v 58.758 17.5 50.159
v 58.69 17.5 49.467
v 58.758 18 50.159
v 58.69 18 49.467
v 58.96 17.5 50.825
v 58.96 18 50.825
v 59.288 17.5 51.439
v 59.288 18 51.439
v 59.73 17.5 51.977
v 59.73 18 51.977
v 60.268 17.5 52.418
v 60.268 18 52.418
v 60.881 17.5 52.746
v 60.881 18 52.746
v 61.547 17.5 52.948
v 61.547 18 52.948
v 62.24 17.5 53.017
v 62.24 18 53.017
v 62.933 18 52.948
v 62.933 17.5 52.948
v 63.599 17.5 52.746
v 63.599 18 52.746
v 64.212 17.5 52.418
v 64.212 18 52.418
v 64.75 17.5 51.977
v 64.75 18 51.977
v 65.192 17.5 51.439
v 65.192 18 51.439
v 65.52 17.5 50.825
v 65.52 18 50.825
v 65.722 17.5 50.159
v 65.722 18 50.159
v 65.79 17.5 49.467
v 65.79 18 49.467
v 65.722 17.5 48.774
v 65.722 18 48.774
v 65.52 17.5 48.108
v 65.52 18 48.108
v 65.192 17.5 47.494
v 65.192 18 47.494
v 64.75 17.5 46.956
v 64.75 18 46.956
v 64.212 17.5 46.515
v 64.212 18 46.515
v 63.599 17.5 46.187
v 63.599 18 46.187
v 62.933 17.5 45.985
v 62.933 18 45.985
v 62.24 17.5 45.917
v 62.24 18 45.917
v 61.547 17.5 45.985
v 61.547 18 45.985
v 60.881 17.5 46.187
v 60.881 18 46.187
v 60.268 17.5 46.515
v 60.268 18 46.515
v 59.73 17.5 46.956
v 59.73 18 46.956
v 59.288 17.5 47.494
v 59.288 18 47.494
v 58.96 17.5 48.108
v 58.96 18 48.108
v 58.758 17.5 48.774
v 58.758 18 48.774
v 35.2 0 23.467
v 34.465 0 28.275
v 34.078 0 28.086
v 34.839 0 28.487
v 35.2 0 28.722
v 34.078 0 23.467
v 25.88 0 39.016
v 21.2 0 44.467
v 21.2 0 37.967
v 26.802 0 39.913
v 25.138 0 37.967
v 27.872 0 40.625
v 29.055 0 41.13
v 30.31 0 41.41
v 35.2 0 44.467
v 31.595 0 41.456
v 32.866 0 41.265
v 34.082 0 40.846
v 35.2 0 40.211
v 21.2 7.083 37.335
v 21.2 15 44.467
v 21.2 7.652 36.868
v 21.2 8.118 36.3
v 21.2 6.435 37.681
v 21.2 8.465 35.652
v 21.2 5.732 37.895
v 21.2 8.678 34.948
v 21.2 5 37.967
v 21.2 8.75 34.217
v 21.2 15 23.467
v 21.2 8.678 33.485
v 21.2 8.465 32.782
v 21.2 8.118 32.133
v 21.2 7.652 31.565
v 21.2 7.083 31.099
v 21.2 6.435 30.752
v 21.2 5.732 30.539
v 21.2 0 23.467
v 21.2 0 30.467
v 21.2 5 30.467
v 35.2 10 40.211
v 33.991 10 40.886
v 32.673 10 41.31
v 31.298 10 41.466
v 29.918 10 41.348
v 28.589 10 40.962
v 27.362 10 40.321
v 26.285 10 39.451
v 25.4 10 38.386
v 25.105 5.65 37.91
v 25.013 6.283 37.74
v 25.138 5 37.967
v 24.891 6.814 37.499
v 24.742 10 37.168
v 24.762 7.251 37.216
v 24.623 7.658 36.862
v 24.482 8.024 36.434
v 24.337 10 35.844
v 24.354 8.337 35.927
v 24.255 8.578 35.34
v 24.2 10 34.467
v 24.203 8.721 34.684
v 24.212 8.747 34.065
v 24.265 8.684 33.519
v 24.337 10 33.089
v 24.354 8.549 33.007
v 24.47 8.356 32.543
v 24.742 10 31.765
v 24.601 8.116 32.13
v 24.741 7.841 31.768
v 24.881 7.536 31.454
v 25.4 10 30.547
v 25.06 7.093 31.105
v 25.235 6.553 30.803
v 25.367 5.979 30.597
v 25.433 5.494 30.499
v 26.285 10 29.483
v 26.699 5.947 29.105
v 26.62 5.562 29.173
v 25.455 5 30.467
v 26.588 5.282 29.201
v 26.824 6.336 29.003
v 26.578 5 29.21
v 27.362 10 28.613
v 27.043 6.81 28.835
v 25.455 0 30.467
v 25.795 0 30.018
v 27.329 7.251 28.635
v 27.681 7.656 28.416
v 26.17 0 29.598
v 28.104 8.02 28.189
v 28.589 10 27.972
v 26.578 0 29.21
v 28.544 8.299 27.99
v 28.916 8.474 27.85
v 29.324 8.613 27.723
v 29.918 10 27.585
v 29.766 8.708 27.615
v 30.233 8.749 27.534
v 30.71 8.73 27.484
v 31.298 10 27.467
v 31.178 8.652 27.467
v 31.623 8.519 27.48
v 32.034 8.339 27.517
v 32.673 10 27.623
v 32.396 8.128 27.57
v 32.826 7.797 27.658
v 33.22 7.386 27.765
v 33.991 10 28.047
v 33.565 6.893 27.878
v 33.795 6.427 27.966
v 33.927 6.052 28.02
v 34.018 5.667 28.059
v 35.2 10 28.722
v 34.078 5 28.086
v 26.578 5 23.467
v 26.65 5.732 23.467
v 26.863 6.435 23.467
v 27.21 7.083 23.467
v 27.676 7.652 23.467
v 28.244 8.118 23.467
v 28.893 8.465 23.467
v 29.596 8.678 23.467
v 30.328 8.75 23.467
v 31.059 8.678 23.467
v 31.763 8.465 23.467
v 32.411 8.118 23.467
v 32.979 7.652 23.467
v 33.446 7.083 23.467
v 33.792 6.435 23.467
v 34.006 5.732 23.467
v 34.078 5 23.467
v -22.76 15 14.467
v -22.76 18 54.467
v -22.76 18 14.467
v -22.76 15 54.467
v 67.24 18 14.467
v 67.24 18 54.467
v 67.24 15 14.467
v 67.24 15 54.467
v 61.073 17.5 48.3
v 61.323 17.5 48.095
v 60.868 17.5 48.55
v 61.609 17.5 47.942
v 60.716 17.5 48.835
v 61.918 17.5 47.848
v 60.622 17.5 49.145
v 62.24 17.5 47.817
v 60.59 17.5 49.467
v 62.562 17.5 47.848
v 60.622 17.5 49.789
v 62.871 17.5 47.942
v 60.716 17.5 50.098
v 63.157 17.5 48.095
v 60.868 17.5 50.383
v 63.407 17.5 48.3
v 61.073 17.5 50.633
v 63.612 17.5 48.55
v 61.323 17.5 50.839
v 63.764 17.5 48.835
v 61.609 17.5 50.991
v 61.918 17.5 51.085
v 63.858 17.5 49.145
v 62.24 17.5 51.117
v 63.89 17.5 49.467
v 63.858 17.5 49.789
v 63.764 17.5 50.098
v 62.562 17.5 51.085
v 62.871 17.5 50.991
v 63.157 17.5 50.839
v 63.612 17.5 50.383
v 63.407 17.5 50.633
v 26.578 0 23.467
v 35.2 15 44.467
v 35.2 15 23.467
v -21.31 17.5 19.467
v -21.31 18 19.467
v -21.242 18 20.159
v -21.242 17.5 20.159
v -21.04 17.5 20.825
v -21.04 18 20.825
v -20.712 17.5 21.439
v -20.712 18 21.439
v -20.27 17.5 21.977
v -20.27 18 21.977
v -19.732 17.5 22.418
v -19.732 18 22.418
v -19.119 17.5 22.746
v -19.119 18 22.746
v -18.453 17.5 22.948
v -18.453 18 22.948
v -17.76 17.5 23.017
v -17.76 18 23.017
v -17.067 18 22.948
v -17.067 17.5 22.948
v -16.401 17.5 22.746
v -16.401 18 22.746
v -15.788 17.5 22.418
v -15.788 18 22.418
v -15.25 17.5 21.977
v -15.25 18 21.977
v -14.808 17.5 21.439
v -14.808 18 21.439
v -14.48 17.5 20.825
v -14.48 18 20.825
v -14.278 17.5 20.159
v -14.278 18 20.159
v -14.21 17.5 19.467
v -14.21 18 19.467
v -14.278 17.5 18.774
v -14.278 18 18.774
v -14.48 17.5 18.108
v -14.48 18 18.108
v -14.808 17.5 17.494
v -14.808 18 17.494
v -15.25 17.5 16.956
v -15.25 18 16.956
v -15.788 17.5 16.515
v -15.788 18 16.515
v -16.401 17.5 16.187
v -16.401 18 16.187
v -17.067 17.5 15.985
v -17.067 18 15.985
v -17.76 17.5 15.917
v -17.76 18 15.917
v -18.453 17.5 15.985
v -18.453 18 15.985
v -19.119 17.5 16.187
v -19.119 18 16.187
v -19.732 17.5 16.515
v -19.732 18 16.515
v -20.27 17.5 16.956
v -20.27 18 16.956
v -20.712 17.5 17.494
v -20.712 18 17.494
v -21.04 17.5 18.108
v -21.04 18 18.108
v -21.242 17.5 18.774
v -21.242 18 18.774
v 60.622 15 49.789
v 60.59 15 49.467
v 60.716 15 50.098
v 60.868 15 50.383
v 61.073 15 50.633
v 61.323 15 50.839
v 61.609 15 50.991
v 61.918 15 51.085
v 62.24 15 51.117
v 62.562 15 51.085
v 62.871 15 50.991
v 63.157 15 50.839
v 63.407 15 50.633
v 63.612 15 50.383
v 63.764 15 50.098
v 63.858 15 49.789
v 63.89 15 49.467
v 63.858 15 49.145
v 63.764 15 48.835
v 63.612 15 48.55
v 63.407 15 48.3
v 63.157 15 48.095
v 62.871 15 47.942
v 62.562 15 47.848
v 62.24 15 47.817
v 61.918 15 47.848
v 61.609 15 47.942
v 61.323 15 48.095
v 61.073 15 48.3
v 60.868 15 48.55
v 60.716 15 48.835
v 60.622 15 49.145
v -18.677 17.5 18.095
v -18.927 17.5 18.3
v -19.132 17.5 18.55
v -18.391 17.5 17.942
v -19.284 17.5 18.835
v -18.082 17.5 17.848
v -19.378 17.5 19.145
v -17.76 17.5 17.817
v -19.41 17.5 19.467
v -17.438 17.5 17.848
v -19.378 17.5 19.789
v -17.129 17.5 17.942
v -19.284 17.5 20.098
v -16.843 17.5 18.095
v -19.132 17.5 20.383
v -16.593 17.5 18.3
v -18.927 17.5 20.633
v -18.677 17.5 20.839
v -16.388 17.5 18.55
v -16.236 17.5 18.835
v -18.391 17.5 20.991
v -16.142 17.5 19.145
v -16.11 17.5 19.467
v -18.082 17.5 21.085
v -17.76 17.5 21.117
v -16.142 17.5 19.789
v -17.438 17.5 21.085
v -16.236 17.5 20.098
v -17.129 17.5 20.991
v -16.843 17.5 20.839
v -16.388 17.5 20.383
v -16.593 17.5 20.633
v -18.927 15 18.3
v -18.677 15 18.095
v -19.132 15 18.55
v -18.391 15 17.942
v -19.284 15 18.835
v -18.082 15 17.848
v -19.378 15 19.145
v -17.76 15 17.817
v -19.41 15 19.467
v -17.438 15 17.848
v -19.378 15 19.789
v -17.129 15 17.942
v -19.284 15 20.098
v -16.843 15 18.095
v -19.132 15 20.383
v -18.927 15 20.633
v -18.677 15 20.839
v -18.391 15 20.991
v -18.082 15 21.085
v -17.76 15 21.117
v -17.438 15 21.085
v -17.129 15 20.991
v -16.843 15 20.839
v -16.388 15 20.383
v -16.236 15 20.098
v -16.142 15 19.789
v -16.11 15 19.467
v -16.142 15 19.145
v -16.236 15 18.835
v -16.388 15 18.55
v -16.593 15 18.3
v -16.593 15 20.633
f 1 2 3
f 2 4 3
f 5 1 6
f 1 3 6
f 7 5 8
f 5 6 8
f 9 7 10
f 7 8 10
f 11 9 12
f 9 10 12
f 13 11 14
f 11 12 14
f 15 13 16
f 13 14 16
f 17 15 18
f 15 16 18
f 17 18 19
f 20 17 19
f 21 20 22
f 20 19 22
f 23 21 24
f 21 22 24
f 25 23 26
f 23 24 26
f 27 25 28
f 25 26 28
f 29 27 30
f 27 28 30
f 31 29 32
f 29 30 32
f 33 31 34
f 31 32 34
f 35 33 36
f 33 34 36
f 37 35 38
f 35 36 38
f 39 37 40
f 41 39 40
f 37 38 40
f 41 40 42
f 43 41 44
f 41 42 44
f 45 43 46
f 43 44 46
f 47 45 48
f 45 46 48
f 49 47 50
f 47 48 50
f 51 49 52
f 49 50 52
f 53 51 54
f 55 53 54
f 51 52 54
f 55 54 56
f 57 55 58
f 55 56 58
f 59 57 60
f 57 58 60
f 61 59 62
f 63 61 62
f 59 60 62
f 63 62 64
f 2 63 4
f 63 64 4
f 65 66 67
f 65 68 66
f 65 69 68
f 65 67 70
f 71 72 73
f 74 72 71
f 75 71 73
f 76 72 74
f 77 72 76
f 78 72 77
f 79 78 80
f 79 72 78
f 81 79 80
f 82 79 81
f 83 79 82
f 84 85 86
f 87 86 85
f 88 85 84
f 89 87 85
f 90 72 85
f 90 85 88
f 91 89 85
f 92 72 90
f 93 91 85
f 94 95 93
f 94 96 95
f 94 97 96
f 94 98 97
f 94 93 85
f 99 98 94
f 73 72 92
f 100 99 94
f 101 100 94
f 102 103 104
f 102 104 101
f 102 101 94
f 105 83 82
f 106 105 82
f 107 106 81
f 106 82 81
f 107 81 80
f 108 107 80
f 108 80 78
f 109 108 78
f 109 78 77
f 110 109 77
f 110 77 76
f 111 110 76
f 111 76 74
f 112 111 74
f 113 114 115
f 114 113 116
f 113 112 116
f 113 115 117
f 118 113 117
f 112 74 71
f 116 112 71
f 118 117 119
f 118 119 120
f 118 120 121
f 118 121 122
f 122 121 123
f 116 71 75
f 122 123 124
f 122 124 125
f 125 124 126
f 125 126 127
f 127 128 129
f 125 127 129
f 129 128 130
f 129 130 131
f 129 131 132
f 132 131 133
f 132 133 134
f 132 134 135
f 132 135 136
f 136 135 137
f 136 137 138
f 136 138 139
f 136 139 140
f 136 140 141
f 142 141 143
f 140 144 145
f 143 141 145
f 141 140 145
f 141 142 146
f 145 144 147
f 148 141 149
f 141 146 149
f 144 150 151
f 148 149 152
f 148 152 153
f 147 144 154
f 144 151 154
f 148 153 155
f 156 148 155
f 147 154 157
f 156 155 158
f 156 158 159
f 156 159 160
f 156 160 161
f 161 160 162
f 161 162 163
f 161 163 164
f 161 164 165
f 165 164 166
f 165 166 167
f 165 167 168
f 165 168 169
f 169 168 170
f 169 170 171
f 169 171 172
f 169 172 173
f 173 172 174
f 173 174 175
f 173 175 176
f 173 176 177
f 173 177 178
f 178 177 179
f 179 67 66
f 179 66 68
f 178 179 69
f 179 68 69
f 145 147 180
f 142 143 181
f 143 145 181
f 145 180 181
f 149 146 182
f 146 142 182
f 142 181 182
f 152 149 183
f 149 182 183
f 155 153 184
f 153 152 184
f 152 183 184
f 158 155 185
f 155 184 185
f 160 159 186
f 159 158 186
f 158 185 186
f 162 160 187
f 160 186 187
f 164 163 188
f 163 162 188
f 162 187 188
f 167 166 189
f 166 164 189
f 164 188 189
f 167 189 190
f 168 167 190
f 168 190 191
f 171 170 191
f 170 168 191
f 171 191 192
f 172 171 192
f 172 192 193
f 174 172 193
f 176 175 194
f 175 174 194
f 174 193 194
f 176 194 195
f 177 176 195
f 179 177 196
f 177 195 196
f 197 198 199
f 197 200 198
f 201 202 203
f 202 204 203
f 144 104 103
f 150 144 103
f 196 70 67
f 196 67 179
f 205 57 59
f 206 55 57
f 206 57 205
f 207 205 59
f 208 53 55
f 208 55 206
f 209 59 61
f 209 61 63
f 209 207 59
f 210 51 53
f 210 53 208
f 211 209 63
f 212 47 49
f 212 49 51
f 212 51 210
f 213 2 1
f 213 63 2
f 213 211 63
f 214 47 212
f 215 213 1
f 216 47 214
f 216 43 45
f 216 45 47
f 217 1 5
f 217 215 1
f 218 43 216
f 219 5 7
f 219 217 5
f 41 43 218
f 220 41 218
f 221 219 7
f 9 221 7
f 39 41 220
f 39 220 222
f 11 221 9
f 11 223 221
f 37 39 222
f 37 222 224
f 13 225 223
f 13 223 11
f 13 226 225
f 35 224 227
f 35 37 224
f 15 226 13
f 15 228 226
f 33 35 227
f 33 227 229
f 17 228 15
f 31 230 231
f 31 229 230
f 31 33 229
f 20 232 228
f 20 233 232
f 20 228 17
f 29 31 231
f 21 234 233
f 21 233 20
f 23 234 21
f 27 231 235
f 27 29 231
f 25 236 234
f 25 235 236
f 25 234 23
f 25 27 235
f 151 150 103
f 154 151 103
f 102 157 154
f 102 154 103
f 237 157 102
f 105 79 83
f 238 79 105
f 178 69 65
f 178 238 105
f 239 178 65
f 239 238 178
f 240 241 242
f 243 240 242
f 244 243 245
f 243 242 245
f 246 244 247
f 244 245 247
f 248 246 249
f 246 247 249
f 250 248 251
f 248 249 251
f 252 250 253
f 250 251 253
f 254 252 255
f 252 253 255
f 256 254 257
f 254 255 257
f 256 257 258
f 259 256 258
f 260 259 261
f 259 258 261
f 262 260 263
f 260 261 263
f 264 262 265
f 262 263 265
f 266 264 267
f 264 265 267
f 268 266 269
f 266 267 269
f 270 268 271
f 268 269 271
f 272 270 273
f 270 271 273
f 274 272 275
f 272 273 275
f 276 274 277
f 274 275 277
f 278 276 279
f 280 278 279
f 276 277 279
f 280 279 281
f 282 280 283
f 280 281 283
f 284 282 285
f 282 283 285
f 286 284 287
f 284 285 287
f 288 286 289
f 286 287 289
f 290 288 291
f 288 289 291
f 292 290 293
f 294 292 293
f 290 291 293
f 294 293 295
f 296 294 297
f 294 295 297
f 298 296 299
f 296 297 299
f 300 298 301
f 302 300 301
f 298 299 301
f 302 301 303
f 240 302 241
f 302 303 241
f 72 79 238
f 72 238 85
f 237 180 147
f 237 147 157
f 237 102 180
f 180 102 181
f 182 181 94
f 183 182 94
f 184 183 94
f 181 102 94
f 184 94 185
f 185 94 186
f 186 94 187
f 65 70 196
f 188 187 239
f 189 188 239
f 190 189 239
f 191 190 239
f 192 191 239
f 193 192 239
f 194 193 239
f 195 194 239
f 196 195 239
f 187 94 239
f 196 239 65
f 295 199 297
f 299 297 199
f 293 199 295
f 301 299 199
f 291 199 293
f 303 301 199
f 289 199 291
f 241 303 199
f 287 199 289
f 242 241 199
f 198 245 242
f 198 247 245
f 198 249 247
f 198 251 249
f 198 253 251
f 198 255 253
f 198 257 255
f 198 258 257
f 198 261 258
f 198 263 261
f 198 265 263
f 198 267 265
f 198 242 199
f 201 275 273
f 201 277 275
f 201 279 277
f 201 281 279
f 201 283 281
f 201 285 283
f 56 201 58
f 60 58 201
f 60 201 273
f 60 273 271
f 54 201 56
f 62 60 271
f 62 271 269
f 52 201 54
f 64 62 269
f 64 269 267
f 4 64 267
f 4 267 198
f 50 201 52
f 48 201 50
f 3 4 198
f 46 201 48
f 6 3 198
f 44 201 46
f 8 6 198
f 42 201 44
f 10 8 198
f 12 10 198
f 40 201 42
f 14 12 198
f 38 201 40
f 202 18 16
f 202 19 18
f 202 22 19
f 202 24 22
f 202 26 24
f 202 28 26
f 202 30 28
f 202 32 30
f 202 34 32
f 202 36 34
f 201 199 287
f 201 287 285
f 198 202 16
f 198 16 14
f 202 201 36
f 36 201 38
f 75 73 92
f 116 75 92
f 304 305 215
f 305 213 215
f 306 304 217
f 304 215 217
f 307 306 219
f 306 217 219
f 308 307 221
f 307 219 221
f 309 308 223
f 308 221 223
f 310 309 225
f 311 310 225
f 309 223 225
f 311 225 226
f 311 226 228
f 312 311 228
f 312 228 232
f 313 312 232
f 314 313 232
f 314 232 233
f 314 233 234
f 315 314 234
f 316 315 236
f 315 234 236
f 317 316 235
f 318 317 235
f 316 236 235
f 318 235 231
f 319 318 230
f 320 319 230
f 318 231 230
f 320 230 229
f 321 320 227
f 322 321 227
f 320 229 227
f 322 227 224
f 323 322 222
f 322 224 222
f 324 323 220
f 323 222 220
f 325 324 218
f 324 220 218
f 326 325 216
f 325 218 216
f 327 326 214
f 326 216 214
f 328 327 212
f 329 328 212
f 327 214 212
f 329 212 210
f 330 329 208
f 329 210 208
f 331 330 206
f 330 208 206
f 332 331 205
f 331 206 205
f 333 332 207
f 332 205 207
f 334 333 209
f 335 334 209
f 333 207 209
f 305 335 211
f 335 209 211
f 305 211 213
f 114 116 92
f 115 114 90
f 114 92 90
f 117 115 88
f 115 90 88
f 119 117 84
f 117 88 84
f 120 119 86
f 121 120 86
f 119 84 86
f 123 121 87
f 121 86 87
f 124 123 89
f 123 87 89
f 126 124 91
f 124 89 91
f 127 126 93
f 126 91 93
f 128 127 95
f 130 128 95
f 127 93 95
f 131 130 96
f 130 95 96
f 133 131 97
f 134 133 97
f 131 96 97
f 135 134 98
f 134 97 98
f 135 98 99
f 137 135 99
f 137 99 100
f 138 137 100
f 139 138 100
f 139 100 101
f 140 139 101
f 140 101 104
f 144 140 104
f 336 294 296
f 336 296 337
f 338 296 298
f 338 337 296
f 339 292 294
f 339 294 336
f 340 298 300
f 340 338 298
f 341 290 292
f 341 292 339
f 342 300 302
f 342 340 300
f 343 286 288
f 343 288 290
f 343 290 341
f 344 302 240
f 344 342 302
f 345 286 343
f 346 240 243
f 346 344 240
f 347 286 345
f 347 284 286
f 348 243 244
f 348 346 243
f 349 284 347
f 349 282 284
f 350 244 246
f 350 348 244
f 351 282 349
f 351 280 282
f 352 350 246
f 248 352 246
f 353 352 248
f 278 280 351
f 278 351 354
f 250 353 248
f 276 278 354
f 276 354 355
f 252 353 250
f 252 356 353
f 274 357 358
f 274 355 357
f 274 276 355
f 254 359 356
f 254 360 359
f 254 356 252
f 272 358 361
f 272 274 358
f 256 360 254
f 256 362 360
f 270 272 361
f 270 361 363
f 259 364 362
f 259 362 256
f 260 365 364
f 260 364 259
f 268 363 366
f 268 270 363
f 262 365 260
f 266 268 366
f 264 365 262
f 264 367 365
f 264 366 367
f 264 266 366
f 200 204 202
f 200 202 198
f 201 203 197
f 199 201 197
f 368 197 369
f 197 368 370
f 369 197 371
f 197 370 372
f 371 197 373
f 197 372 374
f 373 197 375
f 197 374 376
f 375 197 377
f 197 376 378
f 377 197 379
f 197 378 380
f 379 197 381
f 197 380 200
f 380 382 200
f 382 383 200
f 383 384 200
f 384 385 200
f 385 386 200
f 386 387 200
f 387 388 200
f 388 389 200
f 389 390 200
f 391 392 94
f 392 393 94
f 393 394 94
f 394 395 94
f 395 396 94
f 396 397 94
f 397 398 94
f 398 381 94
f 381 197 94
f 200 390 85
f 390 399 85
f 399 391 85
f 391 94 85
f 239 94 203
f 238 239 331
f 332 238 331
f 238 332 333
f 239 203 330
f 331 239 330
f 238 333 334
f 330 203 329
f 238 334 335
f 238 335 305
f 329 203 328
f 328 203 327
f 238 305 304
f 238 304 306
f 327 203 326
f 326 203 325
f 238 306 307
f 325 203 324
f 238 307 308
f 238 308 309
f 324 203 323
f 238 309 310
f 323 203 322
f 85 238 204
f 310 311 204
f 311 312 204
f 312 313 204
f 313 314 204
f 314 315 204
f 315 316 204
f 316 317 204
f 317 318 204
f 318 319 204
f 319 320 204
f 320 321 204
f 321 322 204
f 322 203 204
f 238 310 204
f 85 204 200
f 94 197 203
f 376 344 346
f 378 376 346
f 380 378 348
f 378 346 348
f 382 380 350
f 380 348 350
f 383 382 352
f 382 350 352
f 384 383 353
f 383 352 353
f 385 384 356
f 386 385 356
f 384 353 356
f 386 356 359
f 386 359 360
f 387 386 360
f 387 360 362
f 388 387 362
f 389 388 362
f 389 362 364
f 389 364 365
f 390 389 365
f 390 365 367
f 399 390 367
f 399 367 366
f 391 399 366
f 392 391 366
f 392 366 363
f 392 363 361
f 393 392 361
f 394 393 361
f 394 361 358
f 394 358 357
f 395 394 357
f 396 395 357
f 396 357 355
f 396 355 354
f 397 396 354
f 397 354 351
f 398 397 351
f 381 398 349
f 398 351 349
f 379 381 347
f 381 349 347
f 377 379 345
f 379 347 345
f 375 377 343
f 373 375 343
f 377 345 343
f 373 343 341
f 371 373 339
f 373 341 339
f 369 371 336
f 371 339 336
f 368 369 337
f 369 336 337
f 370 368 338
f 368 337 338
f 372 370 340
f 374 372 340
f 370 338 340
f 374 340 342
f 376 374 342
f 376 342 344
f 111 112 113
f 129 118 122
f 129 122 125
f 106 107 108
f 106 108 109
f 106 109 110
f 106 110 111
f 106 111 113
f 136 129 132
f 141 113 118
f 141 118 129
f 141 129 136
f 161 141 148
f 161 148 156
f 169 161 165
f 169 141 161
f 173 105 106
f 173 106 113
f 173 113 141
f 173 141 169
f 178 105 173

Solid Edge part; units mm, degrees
sketch "Sketch1" plane through (0, 0, 0) normal (0, -1, 0) x (1, 0, 0)
  line L0 (21.2, 4.4667) -> (41.2, 4.4667)
  line L1 (41.2, 4.4667) -> (41.2, 44.4667)
  line L2 (41.2, 44.4667) -> (21.2, 44.4667)
  line L3 (21.2, 44.4667) -> (21.2, 4.4667)
  dimension "D1" = 20
  dimension "D2" = 40
extrude "Protrusion1" add sketch "Sketch1" against normal blind 15
sketch "Sketch2" plane through (31.2, 0, 24.4667) normal (0, -1, 0) x (1, 0, 0)
  circle A0 centre (0, 10) radius 7
  dimension "D1" = 14
  dimension "D2" = 10
extrude "ExtrudedCutout_1" cut sketch "Sketch2" against normal blind 10
sketch "Sketch3" plane through (21.2, 7.5, 24.4667) normal (-1, 0, 0) x (0, -1, 0)
  line L0 (7.5, 13.5) -> (2.5, 13.5)
  arc A0 (2.5, 13.5) -> (2.5, 6) centre (2.5, 9.75) ccw
  line L1 (2.5, 6) -> (7.5, 6)
  line L2 (7.5, 13.5) -> (7.5, 6)
  dimension "D1" = 6.5
  dimension "D2" = 3.75
  dimension "D3" = 5
extrude "Cutout1" cut sketch "Sketch3" against normal through all
sketch "Sketch4" plane through (31.2, 15, 24.4667) normal (0, 1, 0) x (-1, 0, 0)
  line L0 (-10, 20) -> (-4, 20)
  line L1 (-4, 20) -> (-4, -20)
  line L2 (-4, -20) -> (-10, -20)
  line L3 (-10, -20) -> (-10, 20)
  dimension "D1" = 6
extrude "Cutout2" cut sketch "Sketch4" against normal through all
sketch "Sketch5" plane through (28.2, 7.5, 4.4667) normal (0, 0, -1) x (1, 0, 0)
  line L0 (5.8777, 7.5) -> (5.8777, 2.5)
  arc A0 (5.8777, 2.5) -> (-1.6223, 2.5) centre (2.1277, 2.5) cw
  line L1 (-1.6223, 2.5) -> (-1.6223, 7.5)
  line L2 (5.8777, 7.5) -> (-1.6223, 7.5)
  dimension "D1" = 1.6223
  dimension "D2" = 5.8777
extrude "Cutout3" cut sketch "Sketch5" against normal up to next
sketch "Sketch6" plane through (28.2, 15, 24.4667) normal (0, 1, 0) x (-1, 0, 0)
  line L0 (-7, -20) -> (7, -20)
  line L1 (7, -20) -> (7, -1)
  line L2 (7, -1) -> (-7, -1)
  line L3 (-7, -1) -> (-7, -20)
  dimension "D1" = 19
extrude "Cutout4" cut sketch "Sketch6" against normal up to next
sketch "Sketch7" plane through (28.2, 15, 33.9667) normal (0, 1, 0) x (-1, 0, 0)
  line L0 (-39.04, 20.5) -> (-39.04, -19.5)
  line L1 (-39.04, -19.5) -> (50.96, -19.5)
  line L2 (50.96, 20.5) -> (50.96, -19.5)
  line L3 (-39.04, 20.5) -> (50.96, 20.5)
  dimension "D1" = 40
  dimension "D2" = 36.04
  dimension "D3" = 90
  dimension "D4" = 40
extrude "ExtrudedProtrusion_2" add sketch "Sketch7" along normal blind 3
sketch "Sketch8" plane through (19.24, 18, 34.4667) normal (0, 1, 0) x (-1, 0, 0)
  circle A0 centre (-43, 15) radius 1.65
  circle A1 centre (37, -15) radius 1.65
  dimension "D1" = 3.3
  dimension "D2" = 5
  dimension "D3" = 5
  dimension "D4" = 3.3
  dimension "D5" = 5
  dimension "D6" = 5
extrude "Cutout5" cut sketch "Sketch8" against normal through all
sketch "Sketch9" plane through (19.24, 18, 34.4667) normal (0, 1, 0) x (-1, 0, 0)
  circle A0 centre (-43, 15) radius 3.55
  circle A1 centre (37, -15) radius 3.55
extrude "ExtrudedCutout_9" cut sketch "Sketch9" against normal blind 0.5
